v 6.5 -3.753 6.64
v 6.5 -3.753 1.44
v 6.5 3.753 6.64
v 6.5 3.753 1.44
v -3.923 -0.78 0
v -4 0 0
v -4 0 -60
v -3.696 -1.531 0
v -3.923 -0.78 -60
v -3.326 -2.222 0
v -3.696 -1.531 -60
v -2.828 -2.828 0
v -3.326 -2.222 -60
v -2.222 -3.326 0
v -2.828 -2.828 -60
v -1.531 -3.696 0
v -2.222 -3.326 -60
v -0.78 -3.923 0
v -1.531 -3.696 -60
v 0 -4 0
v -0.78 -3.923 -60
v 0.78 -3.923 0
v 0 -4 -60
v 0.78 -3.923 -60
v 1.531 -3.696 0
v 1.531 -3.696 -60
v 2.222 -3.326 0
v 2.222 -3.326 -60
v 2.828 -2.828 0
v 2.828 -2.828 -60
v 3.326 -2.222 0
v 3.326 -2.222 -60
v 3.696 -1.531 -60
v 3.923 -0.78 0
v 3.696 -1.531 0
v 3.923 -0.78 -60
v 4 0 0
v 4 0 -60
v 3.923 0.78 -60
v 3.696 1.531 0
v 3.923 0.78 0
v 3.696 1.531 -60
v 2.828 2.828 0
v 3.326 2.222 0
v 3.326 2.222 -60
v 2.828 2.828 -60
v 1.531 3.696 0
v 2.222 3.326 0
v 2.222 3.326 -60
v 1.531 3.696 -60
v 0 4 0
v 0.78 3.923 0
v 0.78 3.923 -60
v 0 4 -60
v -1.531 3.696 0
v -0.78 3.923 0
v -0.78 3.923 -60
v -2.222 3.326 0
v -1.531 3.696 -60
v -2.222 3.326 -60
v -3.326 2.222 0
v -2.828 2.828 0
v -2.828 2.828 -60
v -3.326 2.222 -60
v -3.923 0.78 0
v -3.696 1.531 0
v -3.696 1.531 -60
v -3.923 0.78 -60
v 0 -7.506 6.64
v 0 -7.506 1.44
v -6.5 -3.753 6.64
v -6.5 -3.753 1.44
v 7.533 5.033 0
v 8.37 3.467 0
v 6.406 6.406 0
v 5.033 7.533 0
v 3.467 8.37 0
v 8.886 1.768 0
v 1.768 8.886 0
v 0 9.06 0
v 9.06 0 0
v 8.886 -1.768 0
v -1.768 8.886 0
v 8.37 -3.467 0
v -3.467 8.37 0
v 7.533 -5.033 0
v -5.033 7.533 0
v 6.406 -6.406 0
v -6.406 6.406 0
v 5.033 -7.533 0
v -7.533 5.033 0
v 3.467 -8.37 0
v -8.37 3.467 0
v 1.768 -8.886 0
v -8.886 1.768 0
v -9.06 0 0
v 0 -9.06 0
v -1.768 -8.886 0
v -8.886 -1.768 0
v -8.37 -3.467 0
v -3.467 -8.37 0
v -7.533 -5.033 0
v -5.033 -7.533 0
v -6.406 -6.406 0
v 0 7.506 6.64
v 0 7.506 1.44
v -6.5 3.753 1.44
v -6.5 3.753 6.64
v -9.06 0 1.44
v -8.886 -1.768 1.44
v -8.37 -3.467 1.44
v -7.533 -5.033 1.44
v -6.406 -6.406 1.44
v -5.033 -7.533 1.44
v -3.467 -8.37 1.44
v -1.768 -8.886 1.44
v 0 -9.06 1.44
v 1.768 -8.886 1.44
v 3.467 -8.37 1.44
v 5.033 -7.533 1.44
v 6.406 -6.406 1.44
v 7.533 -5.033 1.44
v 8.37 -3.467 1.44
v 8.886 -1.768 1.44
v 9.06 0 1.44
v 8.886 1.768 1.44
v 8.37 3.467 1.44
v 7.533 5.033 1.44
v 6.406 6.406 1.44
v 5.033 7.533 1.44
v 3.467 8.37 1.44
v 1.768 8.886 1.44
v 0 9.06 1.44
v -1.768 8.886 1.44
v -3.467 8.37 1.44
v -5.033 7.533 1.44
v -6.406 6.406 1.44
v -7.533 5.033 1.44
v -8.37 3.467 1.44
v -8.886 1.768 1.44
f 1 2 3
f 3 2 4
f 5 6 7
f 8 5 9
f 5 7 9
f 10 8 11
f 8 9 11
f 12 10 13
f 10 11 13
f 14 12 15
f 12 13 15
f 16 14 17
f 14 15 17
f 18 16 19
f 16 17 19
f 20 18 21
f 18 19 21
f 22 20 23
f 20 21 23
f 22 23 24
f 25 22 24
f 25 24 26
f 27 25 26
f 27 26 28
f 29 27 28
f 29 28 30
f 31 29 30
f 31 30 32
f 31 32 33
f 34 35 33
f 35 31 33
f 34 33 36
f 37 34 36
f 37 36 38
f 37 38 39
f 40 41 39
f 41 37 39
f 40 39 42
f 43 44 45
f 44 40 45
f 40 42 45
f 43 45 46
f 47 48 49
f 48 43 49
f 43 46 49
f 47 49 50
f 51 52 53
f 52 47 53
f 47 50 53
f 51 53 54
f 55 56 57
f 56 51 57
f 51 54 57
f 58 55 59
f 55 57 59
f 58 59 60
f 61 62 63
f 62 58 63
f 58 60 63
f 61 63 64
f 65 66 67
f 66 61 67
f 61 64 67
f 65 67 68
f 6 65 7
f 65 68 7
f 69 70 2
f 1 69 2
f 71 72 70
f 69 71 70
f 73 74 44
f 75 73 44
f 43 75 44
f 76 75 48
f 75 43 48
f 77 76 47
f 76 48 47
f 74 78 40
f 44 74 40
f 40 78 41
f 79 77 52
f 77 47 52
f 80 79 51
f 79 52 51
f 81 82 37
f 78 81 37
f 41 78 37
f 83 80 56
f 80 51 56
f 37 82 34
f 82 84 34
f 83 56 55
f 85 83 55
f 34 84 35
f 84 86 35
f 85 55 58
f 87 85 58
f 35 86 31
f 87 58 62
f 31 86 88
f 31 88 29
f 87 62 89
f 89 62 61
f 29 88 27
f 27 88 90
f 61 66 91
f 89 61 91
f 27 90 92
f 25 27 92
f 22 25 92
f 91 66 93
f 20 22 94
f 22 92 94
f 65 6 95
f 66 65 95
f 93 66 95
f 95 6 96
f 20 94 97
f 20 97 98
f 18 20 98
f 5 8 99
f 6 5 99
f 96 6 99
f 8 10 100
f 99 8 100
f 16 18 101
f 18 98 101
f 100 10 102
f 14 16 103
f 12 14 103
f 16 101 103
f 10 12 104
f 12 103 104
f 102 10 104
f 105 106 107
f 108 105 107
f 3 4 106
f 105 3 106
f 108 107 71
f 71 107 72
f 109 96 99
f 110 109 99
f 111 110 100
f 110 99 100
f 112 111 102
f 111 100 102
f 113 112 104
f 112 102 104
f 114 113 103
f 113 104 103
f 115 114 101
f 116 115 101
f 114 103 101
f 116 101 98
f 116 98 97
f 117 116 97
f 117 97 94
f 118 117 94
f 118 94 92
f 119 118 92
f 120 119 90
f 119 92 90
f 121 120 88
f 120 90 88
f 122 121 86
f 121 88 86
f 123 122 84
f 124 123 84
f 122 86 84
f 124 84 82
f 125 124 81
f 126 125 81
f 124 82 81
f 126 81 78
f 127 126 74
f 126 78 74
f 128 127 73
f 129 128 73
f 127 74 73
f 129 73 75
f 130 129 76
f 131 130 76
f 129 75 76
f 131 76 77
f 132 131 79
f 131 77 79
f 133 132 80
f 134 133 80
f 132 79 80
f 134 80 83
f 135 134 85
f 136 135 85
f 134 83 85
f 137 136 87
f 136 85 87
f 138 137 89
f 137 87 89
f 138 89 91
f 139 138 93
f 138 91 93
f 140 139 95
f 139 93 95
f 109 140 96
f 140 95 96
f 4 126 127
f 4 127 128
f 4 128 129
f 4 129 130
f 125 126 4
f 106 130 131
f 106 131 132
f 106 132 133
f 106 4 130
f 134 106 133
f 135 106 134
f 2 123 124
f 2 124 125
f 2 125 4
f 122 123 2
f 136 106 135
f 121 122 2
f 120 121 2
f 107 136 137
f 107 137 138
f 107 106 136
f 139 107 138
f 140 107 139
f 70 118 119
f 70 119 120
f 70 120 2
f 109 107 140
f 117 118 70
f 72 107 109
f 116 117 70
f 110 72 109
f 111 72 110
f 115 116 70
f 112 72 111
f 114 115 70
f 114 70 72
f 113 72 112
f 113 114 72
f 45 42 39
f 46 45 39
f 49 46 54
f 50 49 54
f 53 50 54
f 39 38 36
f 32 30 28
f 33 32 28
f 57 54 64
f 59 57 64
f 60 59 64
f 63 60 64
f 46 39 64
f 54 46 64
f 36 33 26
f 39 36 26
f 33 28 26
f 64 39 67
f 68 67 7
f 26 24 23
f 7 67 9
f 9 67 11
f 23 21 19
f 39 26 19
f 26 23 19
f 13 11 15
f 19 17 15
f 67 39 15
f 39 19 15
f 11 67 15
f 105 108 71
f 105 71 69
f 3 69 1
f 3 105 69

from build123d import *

# Parameters (mm, degrees)
EXTRUDE_SKETCH_1_R = 9.06
EXTRUDE_1_DEPTH    = 1.44
EXTRUDE_START      = 1.44
EXTRUDE_2_DEPTH    = 5.2
EXTRUDE_START_2    = -60
EXTRUDE_SKETCH_3_R = 4
EXTRUDE_3_DEPTH    = 60.01


with BuildPart() as part:
    # Extrude sketch 1 → Extrude 1 (new body)
    with BuildSketch(Plane.XY):
        Circle(EXTRUDE_SKETCH_1_R)
    extrude(amount=EXTRUDE_1_DEPTH)


with BuildPart() as body_2:
    # Extrude sketch 2 → Extrude 2 (new body)
    with BuildSketch(Plane.XY.offset(EXTRUDE_START)):
        Polygon((6.5, 3.75277675), (0, 7.505553499), (-6.5, 3.75277675), (-6.5, -3.75277675), (0, -7.505553499), (6.5, -3.75277675), align=None)
    extrude(amount=EXTRUDE_2_DEPTH)


with BuildPart() as body_3:
    # Extrude sketch 3 → Extrude 3 (new body)
    with BuildSketch(Plane.XY.offset(EXTRUDE_START_2)):
        Circle(EXTRUDE_SKETCH_3_R)
    extrude(amount=EXTRUDE_3_DEPTH)


with BuildPart() as body_2_1:
    add(body_2.part)

    # Combine (weld / assembly of features): union part, body 3
    add(part.part)
    add(body_3.part)


solid = body_2_1.part
